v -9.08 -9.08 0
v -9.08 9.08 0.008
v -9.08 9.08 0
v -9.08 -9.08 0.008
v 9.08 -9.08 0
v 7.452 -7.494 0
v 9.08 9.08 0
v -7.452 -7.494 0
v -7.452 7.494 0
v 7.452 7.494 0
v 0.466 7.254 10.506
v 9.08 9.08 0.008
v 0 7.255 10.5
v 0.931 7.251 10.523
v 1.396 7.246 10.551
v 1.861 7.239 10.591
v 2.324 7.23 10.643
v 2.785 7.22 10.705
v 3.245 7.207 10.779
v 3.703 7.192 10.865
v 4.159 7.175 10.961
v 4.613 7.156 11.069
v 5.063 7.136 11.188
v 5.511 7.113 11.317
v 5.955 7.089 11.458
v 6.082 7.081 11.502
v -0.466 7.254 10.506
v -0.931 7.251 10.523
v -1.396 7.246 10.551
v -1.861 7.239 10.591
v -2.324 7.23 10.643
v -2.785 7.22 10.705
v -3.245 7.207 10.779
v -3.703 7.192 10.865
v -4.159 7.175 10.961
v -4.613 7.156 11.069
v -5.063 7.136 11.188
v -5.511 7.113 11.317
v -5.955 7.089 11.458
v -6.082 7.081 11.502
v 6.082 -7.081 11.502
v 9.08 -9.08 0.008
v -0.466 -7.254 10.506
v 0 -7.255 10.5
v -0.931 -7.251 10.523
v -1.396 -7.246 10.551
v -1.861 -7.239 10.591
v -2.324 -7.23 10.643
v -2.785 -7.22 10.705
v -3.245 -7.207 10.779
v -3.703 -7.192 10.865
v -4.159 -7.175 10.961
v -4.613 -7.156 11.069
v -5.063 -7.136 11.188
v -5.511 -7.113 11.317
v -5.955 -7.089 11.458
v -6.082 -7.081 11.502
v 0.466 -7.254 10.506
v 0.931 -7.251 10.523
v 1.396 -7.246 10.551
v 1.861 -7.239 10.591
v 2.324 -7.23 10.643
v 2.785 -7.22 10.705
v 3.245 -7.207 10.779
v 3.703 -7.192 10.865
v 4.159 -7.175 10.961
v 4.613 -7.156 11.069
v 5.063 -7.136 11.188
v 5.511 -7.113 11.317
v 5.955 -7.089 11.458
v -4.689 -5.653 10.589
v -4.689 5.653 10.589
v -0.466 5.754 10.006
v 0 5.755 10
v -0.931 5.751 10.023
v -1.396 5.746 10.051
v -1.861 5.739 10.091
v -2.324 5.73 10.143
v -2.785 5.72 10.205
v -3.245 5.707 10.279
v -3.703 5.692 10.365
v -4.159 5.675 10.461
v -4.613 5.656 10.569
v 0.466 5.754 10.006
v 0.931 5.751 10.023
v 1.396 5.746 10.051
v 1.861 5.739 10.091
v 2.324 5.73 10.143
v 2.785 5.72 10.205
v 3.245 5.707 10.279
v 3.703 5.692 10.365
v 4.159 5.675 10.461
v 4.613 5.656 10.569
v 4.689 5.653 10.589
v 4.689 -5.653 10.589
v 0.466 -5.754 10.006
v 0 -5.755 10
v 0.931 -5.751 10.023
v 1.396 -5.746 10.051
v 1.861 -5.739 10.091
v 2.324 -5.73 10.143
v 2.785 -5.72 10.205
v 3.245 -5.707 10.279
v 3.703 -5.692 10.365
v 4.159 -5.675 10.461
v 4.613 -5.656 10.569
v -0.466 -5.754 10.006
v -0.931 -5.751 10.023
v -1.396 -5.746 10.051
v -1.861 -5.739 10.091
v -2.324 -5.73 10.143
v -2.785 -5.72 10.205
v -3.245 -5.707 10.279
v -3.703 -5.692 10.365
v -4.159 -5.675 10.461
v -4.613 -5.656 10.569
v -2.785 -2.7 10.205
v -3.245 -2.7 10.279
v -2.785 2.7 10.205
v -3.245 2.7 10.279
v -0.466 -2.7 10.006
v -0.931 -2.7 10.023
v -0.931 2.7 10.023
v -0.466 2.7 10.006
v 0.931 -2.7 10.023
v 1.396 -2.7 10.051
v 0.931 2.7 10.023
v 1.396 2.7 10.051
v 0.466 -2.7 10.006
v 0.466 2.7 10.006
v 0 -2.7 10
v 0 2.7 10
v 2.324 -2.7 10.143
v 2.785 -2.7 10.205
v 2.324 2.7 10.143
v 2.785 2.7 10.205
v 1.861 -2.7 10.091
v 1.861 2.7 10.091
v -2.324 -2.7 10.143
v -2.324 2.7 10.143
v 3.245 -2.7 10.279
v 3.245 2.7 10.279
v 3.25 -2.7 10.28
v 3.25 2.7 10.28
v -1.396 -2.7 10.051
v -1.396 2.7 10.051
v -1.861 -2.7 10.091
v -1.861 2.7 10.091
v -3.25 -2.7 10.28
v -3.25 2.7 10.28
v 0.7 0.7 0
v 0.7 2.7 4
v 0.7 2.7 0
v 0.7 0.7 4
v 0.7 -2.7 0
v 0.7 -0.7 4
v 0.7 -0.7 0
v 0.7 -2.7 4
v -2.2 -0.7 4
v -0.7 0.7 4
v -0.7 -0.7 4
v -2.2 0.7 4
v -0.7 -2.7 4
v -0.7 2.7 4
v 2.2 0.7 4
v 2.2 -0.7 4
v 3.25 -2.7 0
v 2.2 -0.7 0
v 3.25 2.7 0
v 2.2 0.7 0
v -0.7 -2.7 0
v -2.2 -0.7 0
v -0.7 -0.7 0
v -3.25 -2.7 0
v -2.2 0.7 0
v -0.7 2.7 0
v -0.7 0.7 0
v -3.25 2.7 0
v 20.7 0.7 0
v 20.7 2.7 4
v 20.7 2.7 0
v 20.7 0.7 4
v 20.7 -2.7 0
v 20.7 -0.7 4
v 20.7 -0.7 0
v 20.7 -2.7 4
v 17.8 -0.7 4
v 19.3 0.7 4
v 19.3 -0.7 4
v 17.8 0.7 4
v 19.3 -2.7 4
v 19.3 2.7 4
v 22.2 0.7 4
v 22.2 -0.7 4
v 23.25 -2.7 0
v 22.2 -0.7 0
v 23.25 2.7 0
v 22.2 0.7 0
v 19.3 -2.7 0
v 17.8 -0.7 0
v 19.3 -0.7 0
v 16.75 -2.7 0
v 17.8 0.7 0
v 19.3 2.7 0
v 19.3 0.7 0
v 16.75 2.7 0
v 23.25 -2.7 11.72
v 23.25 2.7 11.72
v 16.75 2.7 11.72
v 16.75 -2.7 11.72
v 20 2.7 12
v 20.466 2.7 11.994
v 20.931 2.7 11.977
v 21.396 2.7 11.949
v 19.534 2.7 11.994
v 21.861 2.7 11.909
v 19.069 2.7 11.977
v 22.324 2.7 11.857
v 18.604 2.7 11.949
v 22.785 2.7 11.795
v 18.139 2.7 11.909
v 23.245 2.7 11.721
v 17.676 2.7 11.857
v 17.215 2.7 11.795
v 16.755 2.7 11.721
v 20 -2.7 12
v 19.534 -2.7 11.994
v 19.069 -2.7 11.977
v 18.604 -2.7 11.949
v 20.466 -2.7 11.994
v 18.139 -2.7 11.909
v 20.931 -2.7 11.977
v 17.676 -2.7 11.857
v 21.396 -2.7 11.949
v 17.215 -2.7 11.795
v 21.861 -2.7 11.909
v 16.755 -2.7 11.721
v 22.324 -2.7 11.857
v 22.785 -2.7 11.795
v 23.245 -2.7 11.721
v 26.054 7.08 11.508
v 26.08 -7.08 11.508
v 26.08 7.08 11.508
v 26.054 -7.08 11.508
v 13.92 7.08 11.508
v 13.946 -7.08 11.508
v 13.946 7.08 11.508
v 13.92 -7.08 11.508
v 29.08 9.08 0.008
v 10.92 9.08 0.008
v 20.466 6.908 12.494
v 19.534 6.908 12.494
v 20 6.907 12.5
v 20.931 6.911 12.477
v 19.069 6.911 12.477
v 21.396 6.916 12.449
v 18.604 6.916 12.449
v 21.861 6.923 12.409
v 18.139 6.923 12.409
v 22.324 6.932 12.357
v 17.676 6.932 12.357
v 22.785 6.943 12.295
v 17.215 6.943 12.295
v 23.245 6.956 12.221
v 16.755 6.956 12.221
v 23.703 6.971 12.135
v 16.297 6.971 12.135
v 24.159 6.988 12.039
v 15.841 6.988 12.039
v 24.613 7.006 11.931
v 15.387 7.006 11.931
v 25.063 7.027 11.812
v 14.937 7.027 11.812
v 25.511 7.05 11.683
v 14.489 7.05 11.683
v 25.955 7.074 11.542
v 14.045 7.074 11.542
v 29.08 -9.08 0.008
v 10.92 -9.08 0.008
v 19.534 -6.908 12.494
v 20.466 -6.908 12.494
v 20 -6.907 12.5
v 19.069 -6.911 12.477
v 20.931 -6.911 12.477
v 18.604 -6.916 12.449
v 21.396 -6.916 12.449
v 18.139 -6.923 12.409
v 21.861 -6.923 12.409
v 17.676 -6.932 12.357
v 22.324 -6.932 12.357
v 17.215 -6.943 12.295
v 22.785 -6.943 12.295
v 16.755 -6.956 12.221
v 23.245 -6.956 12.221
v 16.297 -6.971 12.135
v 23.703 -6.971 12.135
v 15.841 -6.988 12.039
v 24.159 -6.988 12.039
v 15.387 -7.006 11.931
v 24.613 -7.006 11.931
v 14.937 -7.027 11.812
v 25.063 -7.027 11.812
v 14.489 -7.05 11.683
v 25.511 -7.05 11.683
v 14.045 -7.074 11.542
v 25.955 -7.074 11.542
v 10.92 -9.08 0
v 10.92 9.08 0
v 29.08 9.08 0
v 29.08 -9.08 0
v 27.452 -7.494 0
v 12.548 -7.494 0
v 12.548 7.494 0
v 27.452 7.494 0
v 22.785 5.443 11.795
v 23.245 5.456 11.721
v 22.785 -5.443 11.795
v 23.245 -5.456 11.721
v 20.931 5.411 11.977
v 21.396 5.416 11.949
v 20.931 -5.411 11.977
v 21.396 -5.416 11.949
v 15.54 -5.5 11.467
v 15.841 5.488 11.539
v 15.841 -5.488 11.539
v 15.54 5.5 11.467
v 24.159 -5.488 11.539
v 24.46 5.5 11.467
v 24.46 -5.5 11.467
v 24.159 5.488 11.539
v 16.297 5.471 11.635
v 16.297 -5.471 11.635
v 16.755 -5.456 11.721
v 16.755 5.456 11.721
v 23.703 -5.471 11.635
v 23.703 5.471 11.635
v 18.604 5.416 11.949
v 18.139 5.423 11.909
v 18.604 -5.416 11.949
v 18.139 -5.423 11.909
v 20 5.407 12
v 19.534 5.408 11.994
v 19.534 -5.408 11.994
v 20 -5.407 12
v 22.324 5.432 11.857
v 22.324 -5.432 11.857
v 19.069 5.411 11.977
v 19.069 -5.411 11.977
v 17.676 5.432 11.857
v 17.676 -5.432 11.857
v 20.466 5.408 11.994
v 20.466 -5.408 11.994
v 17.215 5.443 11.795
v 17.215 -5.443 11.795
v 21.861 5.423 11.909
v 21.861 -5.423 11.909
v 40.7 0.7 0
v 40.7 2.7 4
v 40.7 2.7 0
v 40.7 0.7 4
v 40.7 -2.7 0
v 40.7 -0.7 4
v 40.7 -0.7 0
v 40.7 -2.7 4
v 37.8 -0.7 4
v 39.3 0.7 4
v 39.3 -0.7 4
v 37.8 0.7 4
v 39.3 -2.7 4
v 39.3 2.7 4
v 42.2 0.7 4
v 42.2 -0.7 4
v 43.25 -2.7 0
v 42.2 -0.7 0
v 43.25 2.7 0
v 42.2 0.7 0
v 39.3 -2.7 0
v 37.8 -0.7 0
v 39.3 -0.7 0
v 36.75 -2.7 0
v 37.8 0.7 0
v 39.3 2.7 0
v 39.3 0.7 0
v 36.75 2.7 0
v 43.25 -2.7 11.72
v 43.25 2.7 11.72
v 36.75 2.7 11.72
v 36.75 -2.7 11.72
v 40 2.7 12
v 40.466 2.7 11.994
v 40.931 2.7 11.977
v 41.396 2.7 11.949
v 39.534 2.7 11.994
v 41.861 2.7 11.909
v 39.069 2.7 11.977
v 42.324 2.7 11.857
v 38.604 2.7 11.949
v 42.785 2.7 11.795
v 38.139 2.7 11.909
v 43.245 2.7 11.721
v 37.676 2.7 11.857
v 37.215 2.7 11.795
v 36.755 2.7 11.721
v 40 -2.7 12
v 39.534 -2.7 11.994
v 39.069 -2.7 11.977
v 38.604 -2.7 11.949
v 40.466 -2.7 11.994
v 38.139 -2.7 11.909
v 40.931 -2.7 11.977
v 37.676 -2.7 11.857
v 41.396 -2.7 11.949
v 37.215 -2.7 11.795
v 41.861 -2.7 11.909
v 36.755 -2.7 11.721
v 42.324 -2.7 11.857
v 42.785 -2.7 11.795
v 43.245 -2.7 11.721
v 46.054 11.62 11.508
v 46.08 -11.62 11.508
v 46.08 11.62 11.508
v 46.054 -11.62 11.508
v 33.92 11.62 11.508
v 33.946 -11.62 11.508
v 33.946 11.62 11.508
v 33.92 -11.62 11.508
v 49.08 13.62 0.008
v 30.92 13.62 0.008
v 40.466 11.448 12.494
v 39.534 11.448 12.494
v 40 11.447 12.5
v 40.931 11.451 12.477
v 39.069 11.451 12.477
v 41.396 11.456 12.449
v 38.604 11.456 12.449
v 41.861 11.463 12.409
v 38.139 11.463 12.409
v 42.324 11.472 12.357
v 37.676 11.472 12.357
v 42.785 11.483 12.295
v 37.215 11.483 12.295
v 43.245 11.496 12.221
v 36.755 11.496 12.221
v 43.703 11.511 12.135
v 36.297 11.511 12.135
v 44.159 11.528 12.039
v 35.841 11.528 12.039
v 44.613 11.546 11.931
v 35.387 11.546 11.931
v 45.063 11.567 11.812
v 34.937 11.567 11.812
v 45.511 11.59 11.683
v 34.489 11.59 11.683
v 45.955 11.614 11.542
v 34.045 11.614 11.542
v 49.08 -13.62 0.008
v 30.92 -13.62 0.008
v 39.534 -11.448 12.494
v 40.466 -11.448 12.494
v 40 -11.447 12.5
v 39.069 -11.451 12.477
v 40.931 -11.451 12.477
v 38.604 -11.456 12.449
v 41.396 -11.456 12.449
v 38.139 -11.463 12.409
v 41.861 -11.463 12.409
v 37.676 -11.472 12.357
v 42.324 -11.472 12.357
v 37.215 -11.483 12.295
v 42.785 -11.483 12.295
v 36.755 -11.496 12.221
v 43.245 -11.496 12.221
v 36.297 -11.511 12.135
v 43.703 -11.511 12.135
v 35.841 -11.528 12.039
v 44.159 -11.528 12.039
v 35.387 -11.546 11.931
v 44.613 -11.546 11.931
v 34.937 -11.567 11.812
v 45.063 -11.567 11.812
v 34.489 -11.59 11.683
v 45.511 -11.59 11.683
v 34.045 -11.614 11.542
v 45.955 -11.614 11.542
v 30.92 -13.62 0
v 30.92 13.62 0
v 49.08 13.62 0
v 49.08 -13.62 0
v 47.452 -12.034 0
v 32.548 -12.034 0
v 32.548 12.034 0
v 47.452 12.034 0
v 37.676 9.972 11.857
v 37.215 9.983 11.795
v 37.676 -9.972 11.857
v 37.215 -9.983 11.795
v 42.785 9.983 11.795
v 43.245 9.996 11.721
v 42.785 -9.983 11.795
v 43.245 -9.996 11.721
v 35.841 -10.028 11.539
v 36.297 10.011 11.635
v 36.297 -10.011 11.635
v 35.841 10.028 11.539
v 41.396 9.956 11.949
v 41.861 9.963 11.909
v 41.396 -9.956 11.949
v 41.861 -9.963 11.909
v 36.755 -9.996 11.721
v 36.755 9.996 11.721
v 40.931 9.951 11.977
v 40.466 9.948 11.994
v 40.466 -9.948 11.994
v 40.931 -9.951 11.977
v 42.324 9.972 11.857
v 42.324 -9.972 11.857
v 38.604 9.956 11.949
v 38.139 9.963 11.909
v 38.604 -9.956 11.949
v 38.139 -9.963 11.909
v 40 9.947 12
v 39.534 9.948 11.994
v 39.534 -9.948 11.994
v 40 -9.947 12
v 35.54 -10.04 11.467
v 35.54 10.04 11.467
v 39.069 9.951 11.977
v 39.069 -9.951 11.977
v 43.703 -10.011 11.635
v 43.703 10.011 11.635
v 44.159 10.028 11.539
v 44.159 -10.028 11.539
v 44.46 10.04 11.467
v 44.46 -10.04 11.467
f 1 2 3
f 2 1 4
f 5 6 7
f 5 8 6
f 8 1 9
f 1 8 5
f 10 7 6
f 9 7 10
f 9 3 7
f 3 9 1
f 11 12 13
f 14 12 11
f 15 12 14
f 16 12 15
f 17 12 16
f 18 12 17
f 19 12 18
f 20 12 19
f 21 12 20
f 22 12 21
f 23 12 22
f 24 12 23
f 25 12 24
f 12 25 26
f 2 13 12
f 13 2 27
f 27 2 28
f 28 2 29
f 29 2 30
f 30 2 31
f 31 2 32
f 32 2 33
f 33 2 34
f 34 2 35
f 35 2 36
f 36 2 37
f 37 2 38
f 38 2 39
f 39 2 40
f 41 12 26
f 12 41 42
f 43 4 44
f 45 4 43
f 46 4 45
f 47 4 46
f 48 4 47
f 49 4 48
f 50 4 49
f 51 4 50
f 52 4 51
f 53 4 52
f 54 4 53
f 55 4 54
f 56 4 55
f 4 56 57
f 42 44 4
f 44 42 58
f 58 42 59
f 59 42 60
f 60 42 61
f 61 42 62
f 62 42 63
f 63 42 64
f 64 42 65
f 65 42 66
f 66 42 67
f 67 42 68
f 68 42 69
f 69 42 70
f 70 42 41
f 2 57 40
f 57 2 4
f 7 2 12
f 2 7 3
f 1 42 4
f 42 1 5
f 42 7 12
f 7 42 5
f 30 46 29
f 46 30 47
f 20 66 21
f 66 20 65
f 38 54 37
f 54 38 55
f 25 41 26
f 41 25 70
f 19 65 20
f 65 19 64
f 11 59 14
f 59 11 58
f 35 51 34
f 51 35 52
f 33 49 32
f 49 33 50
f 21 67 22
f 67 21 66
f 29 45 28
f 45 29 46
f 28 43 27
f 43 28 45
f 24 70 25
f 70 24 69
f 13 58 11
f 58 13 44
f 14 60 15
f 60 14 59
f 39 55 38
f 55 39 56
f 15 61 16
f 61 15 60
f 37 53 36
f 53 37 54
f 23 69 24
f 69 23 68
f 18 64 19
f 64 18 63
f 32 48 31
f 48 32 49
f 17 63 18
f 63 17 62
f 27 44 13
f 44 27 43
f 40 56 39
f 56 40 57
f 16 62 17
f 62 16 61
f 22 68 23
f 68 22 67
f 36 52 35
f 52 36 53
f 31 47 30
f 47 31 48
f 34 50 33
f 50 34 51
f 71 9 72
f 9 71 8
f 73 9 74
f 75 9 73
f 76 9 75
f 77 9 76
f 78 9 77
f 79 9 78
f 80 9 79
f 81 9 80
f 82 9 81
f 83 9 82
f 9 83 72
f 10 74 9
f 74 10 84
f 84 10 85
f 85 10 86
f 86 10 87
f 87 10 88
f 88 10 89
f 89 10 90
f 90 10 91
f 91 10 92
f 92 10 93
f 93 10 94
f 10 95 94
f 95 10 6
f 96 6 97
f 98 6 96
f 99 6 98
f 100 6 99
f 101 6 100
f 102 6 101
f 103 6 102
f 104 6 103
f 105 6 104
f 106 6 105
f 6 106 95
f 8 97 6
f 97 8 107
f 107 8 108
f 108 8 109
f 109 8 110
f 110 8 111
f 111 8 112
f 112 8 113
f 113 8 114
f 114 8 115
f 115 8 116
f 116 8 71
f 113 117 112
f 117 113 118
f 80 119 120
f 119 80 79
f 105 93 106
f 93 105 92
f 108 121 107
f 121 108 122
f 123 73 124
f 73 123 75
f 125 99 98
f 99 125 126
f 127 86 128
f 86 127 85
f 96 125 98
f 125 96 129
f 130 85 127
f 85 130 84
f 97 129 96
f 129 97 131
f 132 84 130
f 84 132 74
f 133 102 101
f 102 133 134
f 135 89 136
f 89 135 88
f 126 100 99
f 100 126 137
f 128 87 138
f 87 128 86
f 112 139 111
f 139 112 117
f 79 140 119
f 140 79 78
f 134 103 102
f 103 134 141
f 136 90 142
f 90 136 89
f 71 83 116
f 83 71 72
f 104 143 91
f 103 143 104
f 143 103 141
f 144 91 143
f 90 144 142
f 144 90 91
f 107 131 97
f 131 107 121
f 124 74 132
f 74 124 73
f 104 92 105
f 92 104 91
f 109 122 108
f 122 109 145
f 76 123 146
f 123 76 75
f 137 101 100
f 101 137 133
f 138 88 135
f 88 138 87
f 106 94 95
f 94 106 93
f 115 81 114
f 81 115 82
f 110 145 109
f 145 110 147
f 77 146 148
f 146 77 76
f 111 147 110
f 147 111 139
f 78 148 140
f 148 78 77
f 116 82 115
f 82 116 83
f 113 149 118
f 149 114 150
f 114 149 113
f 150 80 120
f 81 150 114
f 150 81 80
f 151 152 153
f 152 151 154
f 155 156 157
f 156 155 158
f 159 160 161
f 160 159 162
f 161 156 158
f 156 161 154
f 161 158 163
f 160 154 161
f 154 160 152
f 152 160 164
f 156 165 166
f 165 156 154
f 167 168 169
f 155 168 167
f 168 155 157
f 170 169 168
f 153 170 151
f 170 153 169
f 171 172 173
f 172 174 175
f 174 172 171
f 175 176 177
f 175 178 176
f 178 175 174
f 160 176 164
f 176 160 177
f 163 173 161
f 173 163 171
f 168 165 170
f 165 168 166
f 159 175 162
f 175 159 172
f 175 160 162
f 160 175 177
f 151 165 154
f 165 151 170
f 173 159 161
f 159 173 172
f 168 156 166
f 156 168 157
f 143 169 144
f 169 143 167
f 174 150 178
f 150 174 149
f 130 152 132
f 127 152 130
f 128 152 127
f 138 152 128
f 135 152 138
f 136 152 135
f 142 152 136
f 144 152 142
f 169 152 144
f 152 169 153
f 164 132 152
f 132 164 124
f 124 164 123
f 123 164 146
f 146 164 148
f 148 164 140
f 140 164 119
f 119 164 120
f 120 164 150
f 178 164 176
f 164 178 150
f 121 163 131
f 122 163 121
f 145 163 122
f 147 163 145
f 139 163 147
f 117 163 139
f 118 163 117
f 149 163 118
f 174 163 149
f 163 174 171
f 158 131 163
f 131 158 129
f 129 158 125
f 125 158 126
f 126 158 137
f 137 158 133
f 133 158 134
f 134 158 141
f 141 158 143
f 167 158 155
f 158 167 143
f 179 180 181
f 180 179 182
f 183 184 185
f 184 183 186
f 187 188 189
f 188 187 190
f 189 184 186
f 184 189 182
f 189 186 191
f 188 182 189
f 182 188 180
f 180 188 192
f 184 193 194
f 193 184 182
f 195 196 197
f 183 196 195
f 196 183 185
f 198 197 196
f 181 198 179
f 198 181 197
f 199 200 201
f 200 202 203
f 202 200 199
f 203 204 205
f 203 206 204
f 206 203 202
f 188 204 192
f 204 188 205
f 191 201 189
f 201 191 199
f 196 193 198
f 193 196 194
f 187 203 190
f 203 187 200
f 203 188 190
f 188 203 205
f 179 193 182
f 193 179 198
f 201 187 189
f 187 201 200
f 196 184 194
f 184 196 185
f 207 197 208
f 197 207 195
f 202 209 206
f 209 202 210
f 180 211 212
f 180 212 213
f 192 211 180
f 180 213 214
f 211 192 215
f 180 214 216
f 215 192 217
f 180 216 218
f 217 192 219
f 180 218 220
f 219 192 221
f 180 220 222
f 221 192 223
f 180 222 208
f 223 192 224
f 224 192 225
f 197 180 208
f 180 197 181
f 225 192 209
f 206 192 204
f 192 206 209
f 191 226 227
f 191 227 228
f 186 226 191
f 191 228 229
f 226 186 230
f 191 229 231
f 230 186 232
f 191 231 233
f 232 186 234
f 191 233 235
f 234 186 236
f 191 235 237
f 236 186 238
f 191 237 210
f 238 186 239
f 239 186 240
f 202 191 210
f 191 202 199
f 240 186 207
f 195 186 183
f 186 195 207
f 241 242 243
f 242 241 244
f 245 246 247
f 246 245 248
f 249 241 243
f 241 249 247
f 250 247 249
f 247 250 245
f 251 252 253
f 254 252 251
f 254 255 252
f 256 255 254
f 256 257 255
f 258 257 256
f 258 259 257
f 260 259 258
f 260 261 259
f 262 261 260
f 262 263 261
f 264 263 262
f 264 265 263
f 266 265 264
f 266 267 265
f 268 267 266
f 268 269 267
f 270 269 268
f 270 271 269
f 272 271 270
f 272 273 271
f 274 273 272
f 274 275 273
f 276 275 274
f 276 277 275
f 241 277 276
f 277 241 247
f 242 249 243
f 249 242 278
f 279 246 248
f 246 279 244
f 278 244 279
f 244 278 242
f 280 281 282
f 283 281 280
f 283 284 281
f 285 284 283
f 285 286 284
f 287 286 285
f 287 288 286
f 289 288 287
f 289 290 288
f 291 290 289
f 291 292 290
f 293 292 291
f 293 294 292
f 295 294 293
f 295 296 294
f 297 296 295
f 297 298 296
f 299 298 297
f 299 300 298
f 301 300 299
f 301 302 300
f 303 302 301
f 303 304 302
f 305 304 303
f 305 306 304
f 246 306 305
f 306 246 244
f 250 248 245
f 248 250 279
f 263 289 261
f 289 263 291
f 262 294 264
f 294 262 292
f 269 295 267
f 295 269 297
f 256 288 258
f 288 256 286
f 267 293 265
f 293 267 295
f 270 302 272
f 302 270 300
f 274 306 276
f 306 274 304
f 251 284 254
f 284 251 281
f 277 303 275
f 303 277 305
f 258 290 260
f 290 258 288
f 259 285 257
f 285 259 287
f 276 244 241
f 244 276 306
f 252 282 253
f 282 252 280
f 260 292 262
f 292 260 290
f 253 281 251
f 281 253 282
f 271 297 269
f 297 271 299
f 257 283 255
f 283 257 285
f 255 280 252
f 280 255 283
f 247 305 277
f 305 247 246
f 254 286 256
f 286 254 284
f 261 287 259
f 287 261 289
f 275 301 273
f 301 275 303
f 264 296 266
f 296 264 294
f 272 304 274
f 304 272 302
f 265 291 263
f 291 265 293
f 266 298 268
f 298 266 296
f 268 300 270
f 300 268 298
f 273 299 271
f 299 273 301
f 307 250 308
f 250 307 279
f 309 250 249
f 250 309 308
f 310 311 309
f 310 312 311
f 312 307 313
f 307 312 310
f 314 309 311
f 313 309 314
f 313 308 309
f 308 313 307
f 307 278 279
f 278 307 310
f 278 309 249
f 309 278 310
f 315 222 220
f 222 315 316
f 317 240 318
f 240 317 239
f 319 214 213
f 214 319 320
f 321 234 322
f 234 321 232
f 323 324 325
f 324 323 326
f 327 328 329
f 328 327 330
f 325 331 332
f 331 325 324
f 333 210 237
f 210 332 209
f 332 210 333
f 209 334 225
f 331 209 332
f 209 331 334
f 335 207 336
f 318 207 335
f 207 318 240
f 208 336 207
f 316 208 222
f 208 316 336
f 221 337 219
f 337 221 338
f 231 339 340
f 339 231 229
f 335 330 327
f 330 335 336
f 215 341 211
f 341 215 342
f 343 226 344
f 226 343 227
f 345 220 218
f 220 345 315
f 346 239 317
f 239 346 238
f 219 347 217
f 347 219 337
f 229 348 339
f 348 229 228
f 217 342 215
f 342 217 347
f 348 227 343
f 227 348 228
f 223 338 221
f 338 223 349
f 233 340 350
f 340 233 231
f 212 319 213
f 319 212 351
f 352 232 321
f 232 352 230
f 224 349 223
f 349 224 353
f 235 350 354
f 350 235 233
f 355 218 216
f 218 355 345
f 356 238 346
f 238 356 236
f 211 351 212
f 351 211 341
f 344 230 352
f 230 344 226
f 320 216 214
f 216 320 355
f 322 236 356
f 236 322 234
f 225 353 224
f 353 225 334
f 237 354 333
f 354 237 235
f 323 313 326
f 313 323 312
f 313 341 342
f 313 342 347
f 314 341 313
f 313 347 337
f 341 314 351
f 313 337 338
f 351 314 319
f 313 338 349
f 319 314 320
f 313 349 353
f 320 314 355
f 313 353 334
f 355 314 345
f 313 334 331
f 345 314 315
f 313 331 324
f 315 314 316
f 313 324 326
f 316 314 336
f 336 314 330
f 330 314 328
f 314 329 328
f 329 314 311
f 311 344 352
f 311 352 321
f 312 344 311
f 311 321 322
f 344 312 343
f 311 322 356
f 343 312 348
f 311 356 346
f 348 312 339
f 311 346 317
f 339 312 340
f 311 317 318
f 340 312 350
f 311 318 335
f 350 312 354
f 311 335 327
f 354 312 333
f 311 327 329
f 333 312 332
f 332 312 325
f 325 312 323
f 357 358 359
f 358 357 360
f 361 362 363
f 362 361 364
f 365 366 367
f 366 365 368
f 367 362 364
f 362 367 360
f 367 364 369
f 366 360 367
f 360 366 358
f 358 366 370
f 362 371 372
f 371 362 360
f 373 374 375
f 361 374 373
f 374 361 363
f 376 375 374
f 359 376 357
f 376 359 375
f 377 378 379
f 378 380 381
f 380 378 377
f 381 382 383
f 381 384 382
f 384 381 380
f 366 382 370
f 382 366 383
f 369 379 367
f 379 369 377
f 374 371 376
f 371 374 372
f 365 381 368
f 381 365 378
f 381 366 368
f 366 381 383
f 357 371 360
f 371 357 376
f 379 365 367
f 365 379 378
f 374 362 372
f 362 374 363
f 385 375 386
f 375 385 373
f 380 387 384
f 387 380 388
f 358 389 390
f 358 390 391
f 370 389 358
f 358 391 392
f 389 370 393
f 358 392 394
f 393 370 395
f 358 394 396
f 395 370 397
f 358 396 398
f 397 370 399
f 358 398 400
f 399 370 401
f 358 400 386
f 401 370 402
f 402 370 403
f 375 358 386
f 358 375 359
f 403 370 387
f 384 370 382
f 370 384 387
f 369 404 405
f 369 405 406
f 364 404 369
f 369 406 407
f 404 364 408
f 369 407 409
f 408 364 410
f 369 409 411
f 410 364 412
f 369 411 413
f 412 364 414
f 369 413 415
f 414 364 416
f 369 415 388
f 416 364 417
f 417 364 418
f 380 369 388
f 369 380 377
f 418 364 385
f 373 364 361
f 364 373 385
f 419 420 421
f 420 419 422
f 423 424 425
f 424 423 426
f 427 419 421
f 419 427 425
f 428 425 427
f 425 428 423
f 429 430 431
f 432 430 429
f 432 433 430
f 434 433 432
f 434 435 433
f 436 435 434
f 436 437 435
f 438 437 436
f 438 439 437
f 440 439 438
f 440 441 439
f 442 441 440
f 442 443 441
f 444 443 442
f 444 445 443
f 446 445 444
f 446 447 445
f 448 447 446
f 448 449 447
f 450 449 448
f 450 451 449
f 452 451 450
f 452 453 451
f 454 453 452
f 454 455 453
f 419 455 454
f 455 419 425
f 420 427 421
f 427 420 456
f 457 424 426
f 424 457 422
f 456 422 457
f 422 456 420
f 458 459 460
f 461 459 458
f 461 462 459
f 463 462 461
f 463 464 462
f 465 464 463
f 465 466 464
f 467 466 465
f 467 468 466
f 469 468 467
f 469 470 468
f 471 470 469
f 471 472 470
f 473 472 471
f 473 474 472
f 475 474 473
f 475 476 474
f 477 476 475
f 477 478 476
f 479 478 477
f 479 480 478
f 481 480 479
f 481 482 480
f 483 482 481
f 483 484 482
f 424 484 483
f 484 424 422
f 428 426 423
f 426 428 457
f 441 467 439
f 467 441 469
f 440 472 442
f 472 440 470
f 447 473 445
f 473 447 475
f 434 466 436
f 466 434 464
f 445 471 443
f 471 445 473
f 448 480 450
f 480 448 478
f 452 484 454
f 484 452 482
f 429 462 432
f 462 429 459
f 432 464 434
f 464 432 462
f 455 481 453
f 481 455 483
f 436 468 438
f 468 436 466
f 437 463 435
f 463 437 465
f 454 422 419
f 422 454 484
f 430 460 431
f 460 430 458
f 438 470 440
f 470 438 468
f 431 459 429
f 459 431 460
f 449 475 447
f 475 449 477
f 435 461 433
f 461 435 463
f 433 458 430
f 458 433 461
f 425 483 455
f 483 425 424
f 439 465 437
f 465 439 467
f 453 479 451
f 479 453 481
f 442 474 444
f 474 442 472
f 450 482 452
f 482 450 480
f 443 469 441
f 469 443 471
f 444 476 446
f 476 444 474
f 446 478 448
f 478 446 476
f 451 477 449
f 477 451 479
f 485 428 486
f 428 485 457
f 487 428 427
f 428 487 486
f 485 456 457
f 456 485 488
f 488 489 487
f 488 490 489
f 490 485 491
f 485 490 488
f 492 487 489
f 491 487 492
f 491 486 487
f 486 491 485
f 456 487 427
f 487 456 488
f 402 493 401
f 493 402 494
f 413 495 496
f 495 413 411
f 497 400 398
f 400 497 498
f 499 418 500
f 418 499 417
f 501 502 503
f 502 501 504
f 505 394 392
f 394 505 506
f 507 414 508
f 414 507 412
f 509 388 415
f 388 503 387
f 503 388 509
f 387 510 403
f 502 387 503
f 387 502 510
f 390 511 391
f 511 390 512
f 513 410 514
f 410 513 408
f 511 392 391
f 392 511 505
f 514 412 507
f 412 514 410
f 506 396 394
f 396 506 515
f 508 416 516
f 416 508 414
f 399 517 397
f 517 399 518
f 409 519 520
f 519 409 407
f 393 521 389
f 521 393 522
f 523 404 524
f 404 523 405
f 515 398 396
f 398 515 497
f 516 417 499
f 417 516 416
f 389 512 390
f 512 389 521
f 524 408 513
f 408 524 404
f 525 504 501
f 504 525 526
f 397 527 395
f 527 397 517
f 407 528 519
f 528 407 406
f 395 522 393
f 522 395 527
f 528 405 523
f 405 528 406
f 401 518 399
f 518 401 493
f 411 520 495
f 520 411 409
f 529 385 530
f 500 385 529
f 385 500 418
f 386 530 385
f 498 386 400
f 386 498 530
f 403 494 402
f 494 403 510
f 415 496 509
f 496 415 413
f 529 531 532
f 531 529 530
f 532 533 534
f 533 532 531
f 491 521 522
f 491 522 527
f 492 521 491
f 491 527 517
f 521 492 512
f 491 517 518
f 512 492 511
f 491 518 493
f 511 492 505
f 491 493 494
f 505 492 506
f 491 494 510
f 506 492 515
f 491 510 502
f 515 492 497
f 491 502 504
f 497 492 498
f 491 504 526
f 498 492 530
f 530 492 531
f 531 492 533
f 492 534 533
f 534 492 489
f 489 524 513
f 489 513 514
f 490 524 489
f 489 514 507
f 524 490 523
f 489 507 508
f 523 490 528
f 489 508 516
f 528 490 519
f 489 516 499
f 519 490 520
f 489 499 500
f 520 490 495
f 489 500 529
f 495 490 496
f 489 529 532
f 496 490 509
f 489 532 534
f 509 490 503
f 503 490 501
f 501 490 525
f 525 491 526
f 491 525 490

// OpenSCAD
union() {
	translate(v = [0, 0, 0]) {
		union() {
			difference() {
				difference() {
					hull() {
						translate(v = [0.0000000000, 0.0000000000, 0.0000000000]) {
							rotate(a = [0, 0, 0]) {
								linear_extrude(height = 0.0078125000) {
									square(center = true, size = [18.1600000000, 18.1600000000]);
								}
							}
						}
						translate(v = [0.0000000000, 0.0000000000, 5.7500000000]) {
							rotate(a = [0.0000000000, 0, 0]) {
								linear_extrude(height = 0.0078125000) {
									square(center = true, size = [15.1600000000, 16.1600000000]);
								}
							}
						}
						translate(v = [0.0000000000, 0.0000000000, 11.5000000000]) {
							rotate(a = [0.0000000000, 0, 0]) {
								linear_extrude(height = 0.0078125000) {
									square(center = true, size = [12.1600000000, 14.1600000000]);
								}
							}
						}
					}
					translate(v = [0, 0, 11.5000000000]) {
						rotate(a = [90, 0, 0]) {
							translate(v = [0, 17.9832000000, 0]) {
								cylinder($fn = 256, center = true, h = 100, r = 18.9832000000);
							}
						}
					}
				}
				translate(v = [0, 0, -0.5000000000]) {
					difference() {
						hull() {
							translate(v = [0.0000000000, 0.0000000000, 0.0000000000]) {
								rotate(a = [0, 0, 0]) {
									linear_extrude(height = 0.0078125000) {
										square(center = true, size = [15.1600000000, 15.1600000000]);
									}
								}
							}
							translate(v = [0.0000000000, 0.0000000000, 5.7500000000]) {
								rotate(a = [0.0000000000, 0, 0]) {
									linear_extrude(height = 0.0078125000) {
										square(center = true, size = [12.1600000000, 13.1600000000]);
									}
								}
							}
							translate(v = [0.0000000000, 0.0000000000, 11.5000000000]) {
								rotate(a = [0.0000000000, 0, 0]) {
									linear_extrude(height = 0.0078125000) {
										square(center = true, size = [9.1600000000, 11.1600000000]);
									}
								}
							}
						}
						translate(v = [0, 0, 11.5000000000]) {
							rotate(a = [90, 0, 0]) {
								translate(v = [0, 17.9832000000, 0]) {
									cylinder($fn = 256, center = true, h = 100, r = 18.9832000000);
								}
							}
						}
					}
				}
			}
			difference() {
				rotate(a = [0, 0, 0]) {
					difference() {
						translate(v = [-3.2500000000, -2.7000000000, 0]) {
							cube(size = [6.5000000000, 5.4000000000, 50]);
						}
						translate(v = [0, 0, 2.0000000000]) {
							union() {
								cube(center = true, size = [1.4000000000, 5.5000000000, 4]);
								cube(center = true, size = [4.4000000000, 1.4000000000, 4]);
							}
						}
					}
				}
				difference() {
					translate(v = [0, 0, 50]) {
						cube(center = true, size = [100, 100, 100]);
					}
					difference() {
						hull() {
							translate(v = [0.0000000000, 0.0000000000, 0.0000000000]) {
								rotate(a = [0, 0, 0]) {
									linear_extrude(height = 0.0078125000) {
										square(center = true, size = [15.1600000000, 15.1600000000]);
									}
								}
							}
							translate(v = [0.0000000000, 0.0000000000, 5.7500000000]) {
								rotate(a = [0.0000000000, 0, 0]) {
									linear_extrude(height = 0.0078125000) {
										square(center = true, size = [12.1600000000, 13.1600000000]);
									}
								}
							}
							translate(v = [0.0000000000, 0.0000000000, 11.5000000000]) {
								rotate(a = [0.0000000000, 0, 0]) {
									linear_extrude(height = 0.0078125000) {
										square(center = true, size = [9.1600000000, 11.1600000000]);
									}
								}
							}
						}
						translate(v = [0, 0, 11.5000000000]) {
							rotate(a = [90, 0, 0]) {
								translate(v = [0, 17.9832000000, 0]) {
									cylinder($fn = 256, center = true, h = 100, r = 18.9832000000);
								}
							}
						}
					}
				}
			}
		}
	}
	translate(v = [20, 0, 0]) {
		union() {
			difference() {
				difference() {
					union() {
						hull() {
							translate(v = [0.0000000000, 0.0000000000, 0.0000000000]) {
								rotate(a = [0, 0, 0]) {
									linear_extrude(height = 0.0078125000) {
										square(center = true, size = [18.1600000000, 18.1600000000]);
									}
								}
							}
							translate(v = [0.0000000000, 0.0000000000, 5.7500000000]) {
								rotate(a = [0.0000000000, 0, 0]) {
									linear_extrude(height = 0.0078125000) {
										square(center = true, size = [15.1600000000, 16.1600000000]);
									}
								}
							}
							translate(v = [0.0000000000, 0.0000000000, 11.5000000000]) {
								rotate(a = [0.0000000000, 0, 0]) {
									linear_extrude(height = 0.0078125000) {
										square(center = true, size = [12.1600000000, 14.1600000000]);
									}
								}
							}
						}
						translate(v = [0, 0, 11.5000000000]) {
							rotate(a = [90, 0, 0]) {
								translate(v = [0, -17.9832000000, 0]) {
									cylinder($fn = 256, center = true, h = 100, r = 18.9832000000);
								}
							}
						}
					}
					difference() {
						cube(center = true, size = [1000, 1000, 1000]);
						hull() {
							translate(v = [0.0000000000, 0.0000000000, 0.0000000000]) {
								rotate(a = [0, 0, 0]) {
									linear_extrude(height = 0.0078125000) {
										square(center = true, size = [18.1600000000, 18.1600000000]);
									}
								}
							}
							translate(v = [0.0000000000, 0.0000000000, 11.5000000000]) {
								rotate(a = [0.0000000000, 0, 0]) {
									linear_extrude(height = 0.0078125000) {
										square(center = true, size = [12.1600000000, 14.1600000000]);
									}
								}
							}
							translate(v = [0.0000000000, 0.0000000000, 23.0000000000]) {
								rotate(a = [0.0000000000, 0, 0]) {
									linear_extrude(height = 0.0078125000) {
										square(center = true, size = [6.1600000000, 10.1600000000]);
									}
								}
							}
						}
					}
				}
				translate(v = [0, 0, -0.5000000000]) {
					difference() {
						union() {
							hull() {
								translate(v = [0.0000000000, 0.0000000000, 0.0000000000]) {
									rotate(a = [0, 0, 0]) {
										linear_extrude(height = 0.0078125000) {
											square(center = true, size = [15.1600000000, 15.1600000000]);
										}
									}
								}
								translate(v = [0.0000000000, 0.0000000000, 5.7500000000]) {
									rotate(a = [0.0000000000, 0, 0]) {
										linear_extrude(height = 0.0078125000) {
											square(center = true, size = [12.1600000000, 13.1600000000]);
										}
									}
								}
								translate(v = [0.0000000000, 0.0000000000, 11.5000000000]) {
									rotate(a = [0.0000000000, 0, 0]) {
										linear_extrude(height = 0.0078125000) {
											square(center = true, size = [9.1600000000, 11.1600000000]);
										}
									}
								}
							}
							translate(v = [0, 0, 11.5000000000]) {
								rotate(a = [90, 0, 0]) {
									translate(v = [0, -17.9832000000, 0]) {
										cylinder($fn = 256, center = true, h = 100, r = 18.9832000000);
									}
								}
							}
						}
						difference() {
							cube(center = true, size = [1000, 1000, 1000]);
							hull() {
								translate(v = [0.0000000000, 0.0000000000, 0.0000000000]) {
									rotate(a = [0, 0, 0]) {
										linear_extrude(height = 0.0078125000) {
											square(center = true, size = [15.1600000000, 15.1600000000]);
										}
									}
								}
								translate(v = [0.0000000000, 0.0000000000, 11.5000000000]) {
									rotate(a = [0.0000000000, 0, 0]) {
										linear_extrude(height = 0.0078125000) {
											square(center = true, size = [9.1600000000, 11.1600000000]);
										}
									}
								}
								translate(v = [0.0000000000, 0.0000000000, 23.0000000000]) {
									rotate(a = [0.0000000000, 0, 0]) {
										linear_extrude(height = 0.0078125000) {
											square(center = true, size = [3.1600000000, 7.1600000000]);
										}
									}
								}
							}
						}
					}
				}
			}
			difference() {
				rotate(a = [0, 0, 0]) {
					difference() {
						translate(v = [-3.2500000000, -2.7000000000, 0]) {
							cube(size = [6.5000000000, 5.4000000000, 50]);
						}
						translate(v = [0, 0, 2.0000000000]) {
							union() {
								cube(center = true, size = [1.4000000000, 5.5000000000, 4]);
								cube(center = true, size = [4.4000000000, 1.4000000000, 4]);
							}
						}
					}
				}
				difference() {
					translate(v = [0, 0, 50]) {
						cube(center = true, size = [100, 100, 100]);
					}
					difference() {
						union() {
							hull() {
								translate(v = [0.0000000000, 0.0000000000, 0.0000000000]) {
									rotate(a = [0, 0, 0]) {
										linear_extrude(height = 0.0078125000) {
											square(center = true, size = [15.1600000000, 15.1600000000]);
										}
									}
								}
								translate(v = [0.0000000000, 0.0000000000, 5.7500000000]) {
									rotate(a = [0.0000000000, 0, 0]) {
										linear_extrude(height = 0.0078125000) {
											square(center = true, size = [12.1600000000, 13.1600000000]);
										}
									}
								}
								translate(v = [0.0000000000, 0.0000000000, 11.5000000000]) {
									rotate(a = [0.0000000000, 0, 0]) {
										linear_extrude(height = 0.0078125000) {
											square(center = true, size = [9.1600000000, 11.1600000000]);
										}
									}
								}
							}
							translate(v = [0, 0, 11.5000000000]) {
								rotate(a = [90, 0, 0]) {
									translate(v = [0, -17.9832000000, 0]) {
										cylinder($fn = 256, center = true, h = 100, r = 18.9832000000);
									}
								}
							}
						}
						difference() {
							cube(center = true, size = [1000, 1000, 1000]);
							hull() {
								translate(v = [0.0000000000, 0.0000000000, 0.0000000000]) {
									rotate(a = [0, 0, 0]) {
										linear_extrude(height = 0.0078125000) {
											square(center = true, size = [15.1600000000, 15.1600000000]);
										}
									}
								}
								translate(v = [0.0000000000, 0.0000000000, 11.5000000000]) {
									rotate(a = [0.0000000000, 0, 0]) {
										linear_extrude(height = 0.0078125000) {
											square(center = true, size = [9.1600000000, 11.1600000000]);
										}
									}
								}
								translate(v = [0.0000000000, 0.0000000000, 23.0000000000]) {
									rotate(a = [0.0000000000, 0, 0]) {
										linear_extrude(height = 0.0078125000) {
											square(center = true, size = [3.1600000000, 7.1600000000]);
										}
									}
								}
							}
						}
					}
				}
			}
		}
	}
	translate(v = [40, 0, 0]) {
		union() {
			difference() {
				difference() {
					union() {
						hull() {
							translate(v = [0.0000000000, 0.0000000000, 0.0000000000]) {
								rotate(a = [0, 0, 0]) {
									linear_extrude(height = 0.0078125000) {
										square(center = true, size = [18.1600000000, 27.2400000000]);
									}
								}
							}
							translate(v = [0.0000000000, 0.0000000000, 5.7500000000]) {
								rotate(a = [0.0000000000, 0, 0]) {
									linear_extrude(height = 0.0078125000) {
										square(center = true, size = [15.1600000000, 25.2400000000]);
									}
								}
							}
							translate(v = [0.0000000000, 0.0000000000, 11.5000000000]) {
								rotate(a = [0.0000000000, 0, 0]) {
									linear_extrude(height = 0.0078125000) {
										square(center = true, size = [12.1600000000, 23.2400000000]);
									}
								}
							}
						}
						translate(v = [0, 0, 11.5000000000]) {
							rotate(a = [90, 0, 0]) {
								translate(v = [0, -17.9832000000, 0]) {
									cylinder($fn = 256, center = true, h = 100, r = 18.9832000000);
								}
							}
						}
					}
					difference() {
						cube(center = true, size = [1000, 1000, 1000]);
						hull() {
							translate(v = [0.0000000000, 0.0000000000, 0.0000000000]) {
								rotate(a = [0, 0, 0]) {
									linear_extrude(height = 0.0078125000) {
										square(center = true, size = [18.1600000000, 27.2400000000]);
									}
								}
							}
							translate(v = [0.0000000000, 0.0000000000, 11.5000000000]) {
								rotate(a = [0.0000000000, 0, 0]) {
									linear_extrude(height = 0.0078125000) {
										square(center = true, size = [12.1600000000, 23.2400000000]);
									}
								}
							}
							translate(v = [0.0000000000, 0.0000000000, 23.0000000000]) {
								rotate(a = [0.0000000000, 0, 0]) {
									linear_extrude(height = 0.0078125000) {
										square(center = true, size = [6.1600000000, 19.2400000000]);
									}
								}
							}
						}
					}
				}
				translate(v = [0, 0, -0.5000000000]) {
					difference() {
						union() {
							hull() {
								translate(v = [0.0000000000, 0.0000000000, 0.0000000000]) {
									rotate(a = [0, 0, 0]) {
										linear_extrude(height = 0.0078125000) {
											square(center = true, size = [15.1600000000, 24.2400000000]);
										}
									}
								}
								translate(v = [0.0000000000, 0.0000000000, 5.7500000000]) {
									rotate(a = [0.0000000000, 0, 0]) {
										linear_extrude(height = 0.0078125000) {
											square(center = true, size = [12.1600000000, 22.2400000000]);
										}
									}
								}
								translate(v = [0.0000000000, 0.0000000000, 11.5000000000]) {
									rotate(a = [0.0000000000, 0, 0]) {
										linear_extrude(height = 0.0078125000) {
											square(center = true, size = [9.1600000000, 20.2400000000]);
										}
									}
								}
							}
							translate(v = [0, 0, 11.5000000000]) {
								rotate(a = [90, 0, 0]) {
									translate(v = [0, -17.9832000000, 0]) {
										cylinder($fn = 256, center = true, h = 100, r = 18.9832000000);
									}
								}
							}
						}
						difference() {
							cube(center = true, size = [1000, 1000, 1000]);
							hull() {
								translate(v = [0.0000000000, 0.0000000000, 0.0000000000]) {
									rotate(a = [0, 0, 0]) {
										linear_extrude(height = 0.0078125000) {
											square(center = true, size = [15.1600000000, 24.2400000000]);
										}
									}
								}
								translate(v = [0.0000000000, 0.0000000000, 11.5000000000]) {
									rotate(a = [0.0000000000, 0, 0]) {
										linear_extrude(height = 0.0078125000) {
											square(center = true, size = [9.1600000000, 20.2400000000]);
										}
									}
								}
								translate(v = [0.0000000000, 0.0000000000, 23.0000000000]) {
									rotate(a = [0.0000000000, 0, 0]) {
										linear_extrude(height = 0.0078125000) {
											square(center = true, size = [3.1600000000, 16.2400000000]);
										}
									}
								}
							}
						}
					}
				}
			}
			difference() {
				rotate(a = [0, 0, 0]) {
					difference() {
						translate(v = [-3.2500000000, -2.7000000000, 0]) {
							cube(size = [6.5000000000, 5.4000000000, 50]);
						}
						translate(v = [0, 0, 2.0000000000]) {
							union() {
								cube(center = true, size = [1.4000000000, 5.5000000000, 4]);
								cube(center = true, size = [4.4000000000, 1.4000000000, 4]);
							}
						}
					}
				}
				difference() {
					translate(v = [0, 0, 50]) {
						cube(center = true, size = [100, 100, 100]);
					}
					difference() {
						union() {
							hull() {
								translate(v = [0.0000000000, 0.0000000000, 0.0000000000]) {
									rotate(a = [0, 0, 0]) {
										linear_extrude(height = 0.0078125000) {
											square(center = true, size = [15.1600000000, 24.2400000000]);
										}
									}
								}
								translate(v = [0.0000000000, 0.0000000000, 5.7500000000]) {
									rotate(a = [0.0000000000, 0, 0]) {
										linear_extrude(height = 0.0078125000) {
											square(center = true, size = [12.1600000000, 22.2400000000]);
										}
									}
								}
								translate(v = [0.0000000000, 0.0000000000, 11.5000000000]) {
									rotate(a = [0.0000000000, 0, 0]) {
										linear_extrude(height = 0.0078125000) {
											square(center = true, size = [9.1600000000, 20.2400000000]);
										}
									}
								}
							}
							translate(v = [0, 0, 11.5000000000]) {
								rotate(a = [90, 0, 0]) {
									translate(v = [0, -17.9832000000, 0]) {
										cylinder($fn = 256, center = true, h = 100, r = 18.9832000000);
									}
								}
							}
						}
						difference() {
							cube(center = true, size = [1000, 1000, 1000]);
							hull() {
								translate(v = [0.0000000000, 0.0000000000, 0.0000000000]) {
									rotate(a = [0, 0, 0]) {
										linear_extrude(height = 0.0078125000) {
											square(center = true, size = [15.1600000000, 24.2400000000]);
										}
									}
								}
								translate(v = [0.0000000000, 0.0000000000, 11.5000000000]) {
									rotate(a = [0.0000000000, 0, 0]) {
										linear_extrude(height = 0.0078125000) {
											square(center = true, size = [9.1600000000, 20.2400000000]);
										}
									}
								}
								translate(v = [0.0000000000, 0.0000000000, 23.0000000000]) {
									rotate(a = [0.0000000000, 0, 0]) {
										linear_extrude(height = 0.0078125000) {
											square(center = true, size = [3.1600000000, 16.2400000000]);
										}
									}
								}
							}
						}
					}
				}
			}
		}
	}
}
